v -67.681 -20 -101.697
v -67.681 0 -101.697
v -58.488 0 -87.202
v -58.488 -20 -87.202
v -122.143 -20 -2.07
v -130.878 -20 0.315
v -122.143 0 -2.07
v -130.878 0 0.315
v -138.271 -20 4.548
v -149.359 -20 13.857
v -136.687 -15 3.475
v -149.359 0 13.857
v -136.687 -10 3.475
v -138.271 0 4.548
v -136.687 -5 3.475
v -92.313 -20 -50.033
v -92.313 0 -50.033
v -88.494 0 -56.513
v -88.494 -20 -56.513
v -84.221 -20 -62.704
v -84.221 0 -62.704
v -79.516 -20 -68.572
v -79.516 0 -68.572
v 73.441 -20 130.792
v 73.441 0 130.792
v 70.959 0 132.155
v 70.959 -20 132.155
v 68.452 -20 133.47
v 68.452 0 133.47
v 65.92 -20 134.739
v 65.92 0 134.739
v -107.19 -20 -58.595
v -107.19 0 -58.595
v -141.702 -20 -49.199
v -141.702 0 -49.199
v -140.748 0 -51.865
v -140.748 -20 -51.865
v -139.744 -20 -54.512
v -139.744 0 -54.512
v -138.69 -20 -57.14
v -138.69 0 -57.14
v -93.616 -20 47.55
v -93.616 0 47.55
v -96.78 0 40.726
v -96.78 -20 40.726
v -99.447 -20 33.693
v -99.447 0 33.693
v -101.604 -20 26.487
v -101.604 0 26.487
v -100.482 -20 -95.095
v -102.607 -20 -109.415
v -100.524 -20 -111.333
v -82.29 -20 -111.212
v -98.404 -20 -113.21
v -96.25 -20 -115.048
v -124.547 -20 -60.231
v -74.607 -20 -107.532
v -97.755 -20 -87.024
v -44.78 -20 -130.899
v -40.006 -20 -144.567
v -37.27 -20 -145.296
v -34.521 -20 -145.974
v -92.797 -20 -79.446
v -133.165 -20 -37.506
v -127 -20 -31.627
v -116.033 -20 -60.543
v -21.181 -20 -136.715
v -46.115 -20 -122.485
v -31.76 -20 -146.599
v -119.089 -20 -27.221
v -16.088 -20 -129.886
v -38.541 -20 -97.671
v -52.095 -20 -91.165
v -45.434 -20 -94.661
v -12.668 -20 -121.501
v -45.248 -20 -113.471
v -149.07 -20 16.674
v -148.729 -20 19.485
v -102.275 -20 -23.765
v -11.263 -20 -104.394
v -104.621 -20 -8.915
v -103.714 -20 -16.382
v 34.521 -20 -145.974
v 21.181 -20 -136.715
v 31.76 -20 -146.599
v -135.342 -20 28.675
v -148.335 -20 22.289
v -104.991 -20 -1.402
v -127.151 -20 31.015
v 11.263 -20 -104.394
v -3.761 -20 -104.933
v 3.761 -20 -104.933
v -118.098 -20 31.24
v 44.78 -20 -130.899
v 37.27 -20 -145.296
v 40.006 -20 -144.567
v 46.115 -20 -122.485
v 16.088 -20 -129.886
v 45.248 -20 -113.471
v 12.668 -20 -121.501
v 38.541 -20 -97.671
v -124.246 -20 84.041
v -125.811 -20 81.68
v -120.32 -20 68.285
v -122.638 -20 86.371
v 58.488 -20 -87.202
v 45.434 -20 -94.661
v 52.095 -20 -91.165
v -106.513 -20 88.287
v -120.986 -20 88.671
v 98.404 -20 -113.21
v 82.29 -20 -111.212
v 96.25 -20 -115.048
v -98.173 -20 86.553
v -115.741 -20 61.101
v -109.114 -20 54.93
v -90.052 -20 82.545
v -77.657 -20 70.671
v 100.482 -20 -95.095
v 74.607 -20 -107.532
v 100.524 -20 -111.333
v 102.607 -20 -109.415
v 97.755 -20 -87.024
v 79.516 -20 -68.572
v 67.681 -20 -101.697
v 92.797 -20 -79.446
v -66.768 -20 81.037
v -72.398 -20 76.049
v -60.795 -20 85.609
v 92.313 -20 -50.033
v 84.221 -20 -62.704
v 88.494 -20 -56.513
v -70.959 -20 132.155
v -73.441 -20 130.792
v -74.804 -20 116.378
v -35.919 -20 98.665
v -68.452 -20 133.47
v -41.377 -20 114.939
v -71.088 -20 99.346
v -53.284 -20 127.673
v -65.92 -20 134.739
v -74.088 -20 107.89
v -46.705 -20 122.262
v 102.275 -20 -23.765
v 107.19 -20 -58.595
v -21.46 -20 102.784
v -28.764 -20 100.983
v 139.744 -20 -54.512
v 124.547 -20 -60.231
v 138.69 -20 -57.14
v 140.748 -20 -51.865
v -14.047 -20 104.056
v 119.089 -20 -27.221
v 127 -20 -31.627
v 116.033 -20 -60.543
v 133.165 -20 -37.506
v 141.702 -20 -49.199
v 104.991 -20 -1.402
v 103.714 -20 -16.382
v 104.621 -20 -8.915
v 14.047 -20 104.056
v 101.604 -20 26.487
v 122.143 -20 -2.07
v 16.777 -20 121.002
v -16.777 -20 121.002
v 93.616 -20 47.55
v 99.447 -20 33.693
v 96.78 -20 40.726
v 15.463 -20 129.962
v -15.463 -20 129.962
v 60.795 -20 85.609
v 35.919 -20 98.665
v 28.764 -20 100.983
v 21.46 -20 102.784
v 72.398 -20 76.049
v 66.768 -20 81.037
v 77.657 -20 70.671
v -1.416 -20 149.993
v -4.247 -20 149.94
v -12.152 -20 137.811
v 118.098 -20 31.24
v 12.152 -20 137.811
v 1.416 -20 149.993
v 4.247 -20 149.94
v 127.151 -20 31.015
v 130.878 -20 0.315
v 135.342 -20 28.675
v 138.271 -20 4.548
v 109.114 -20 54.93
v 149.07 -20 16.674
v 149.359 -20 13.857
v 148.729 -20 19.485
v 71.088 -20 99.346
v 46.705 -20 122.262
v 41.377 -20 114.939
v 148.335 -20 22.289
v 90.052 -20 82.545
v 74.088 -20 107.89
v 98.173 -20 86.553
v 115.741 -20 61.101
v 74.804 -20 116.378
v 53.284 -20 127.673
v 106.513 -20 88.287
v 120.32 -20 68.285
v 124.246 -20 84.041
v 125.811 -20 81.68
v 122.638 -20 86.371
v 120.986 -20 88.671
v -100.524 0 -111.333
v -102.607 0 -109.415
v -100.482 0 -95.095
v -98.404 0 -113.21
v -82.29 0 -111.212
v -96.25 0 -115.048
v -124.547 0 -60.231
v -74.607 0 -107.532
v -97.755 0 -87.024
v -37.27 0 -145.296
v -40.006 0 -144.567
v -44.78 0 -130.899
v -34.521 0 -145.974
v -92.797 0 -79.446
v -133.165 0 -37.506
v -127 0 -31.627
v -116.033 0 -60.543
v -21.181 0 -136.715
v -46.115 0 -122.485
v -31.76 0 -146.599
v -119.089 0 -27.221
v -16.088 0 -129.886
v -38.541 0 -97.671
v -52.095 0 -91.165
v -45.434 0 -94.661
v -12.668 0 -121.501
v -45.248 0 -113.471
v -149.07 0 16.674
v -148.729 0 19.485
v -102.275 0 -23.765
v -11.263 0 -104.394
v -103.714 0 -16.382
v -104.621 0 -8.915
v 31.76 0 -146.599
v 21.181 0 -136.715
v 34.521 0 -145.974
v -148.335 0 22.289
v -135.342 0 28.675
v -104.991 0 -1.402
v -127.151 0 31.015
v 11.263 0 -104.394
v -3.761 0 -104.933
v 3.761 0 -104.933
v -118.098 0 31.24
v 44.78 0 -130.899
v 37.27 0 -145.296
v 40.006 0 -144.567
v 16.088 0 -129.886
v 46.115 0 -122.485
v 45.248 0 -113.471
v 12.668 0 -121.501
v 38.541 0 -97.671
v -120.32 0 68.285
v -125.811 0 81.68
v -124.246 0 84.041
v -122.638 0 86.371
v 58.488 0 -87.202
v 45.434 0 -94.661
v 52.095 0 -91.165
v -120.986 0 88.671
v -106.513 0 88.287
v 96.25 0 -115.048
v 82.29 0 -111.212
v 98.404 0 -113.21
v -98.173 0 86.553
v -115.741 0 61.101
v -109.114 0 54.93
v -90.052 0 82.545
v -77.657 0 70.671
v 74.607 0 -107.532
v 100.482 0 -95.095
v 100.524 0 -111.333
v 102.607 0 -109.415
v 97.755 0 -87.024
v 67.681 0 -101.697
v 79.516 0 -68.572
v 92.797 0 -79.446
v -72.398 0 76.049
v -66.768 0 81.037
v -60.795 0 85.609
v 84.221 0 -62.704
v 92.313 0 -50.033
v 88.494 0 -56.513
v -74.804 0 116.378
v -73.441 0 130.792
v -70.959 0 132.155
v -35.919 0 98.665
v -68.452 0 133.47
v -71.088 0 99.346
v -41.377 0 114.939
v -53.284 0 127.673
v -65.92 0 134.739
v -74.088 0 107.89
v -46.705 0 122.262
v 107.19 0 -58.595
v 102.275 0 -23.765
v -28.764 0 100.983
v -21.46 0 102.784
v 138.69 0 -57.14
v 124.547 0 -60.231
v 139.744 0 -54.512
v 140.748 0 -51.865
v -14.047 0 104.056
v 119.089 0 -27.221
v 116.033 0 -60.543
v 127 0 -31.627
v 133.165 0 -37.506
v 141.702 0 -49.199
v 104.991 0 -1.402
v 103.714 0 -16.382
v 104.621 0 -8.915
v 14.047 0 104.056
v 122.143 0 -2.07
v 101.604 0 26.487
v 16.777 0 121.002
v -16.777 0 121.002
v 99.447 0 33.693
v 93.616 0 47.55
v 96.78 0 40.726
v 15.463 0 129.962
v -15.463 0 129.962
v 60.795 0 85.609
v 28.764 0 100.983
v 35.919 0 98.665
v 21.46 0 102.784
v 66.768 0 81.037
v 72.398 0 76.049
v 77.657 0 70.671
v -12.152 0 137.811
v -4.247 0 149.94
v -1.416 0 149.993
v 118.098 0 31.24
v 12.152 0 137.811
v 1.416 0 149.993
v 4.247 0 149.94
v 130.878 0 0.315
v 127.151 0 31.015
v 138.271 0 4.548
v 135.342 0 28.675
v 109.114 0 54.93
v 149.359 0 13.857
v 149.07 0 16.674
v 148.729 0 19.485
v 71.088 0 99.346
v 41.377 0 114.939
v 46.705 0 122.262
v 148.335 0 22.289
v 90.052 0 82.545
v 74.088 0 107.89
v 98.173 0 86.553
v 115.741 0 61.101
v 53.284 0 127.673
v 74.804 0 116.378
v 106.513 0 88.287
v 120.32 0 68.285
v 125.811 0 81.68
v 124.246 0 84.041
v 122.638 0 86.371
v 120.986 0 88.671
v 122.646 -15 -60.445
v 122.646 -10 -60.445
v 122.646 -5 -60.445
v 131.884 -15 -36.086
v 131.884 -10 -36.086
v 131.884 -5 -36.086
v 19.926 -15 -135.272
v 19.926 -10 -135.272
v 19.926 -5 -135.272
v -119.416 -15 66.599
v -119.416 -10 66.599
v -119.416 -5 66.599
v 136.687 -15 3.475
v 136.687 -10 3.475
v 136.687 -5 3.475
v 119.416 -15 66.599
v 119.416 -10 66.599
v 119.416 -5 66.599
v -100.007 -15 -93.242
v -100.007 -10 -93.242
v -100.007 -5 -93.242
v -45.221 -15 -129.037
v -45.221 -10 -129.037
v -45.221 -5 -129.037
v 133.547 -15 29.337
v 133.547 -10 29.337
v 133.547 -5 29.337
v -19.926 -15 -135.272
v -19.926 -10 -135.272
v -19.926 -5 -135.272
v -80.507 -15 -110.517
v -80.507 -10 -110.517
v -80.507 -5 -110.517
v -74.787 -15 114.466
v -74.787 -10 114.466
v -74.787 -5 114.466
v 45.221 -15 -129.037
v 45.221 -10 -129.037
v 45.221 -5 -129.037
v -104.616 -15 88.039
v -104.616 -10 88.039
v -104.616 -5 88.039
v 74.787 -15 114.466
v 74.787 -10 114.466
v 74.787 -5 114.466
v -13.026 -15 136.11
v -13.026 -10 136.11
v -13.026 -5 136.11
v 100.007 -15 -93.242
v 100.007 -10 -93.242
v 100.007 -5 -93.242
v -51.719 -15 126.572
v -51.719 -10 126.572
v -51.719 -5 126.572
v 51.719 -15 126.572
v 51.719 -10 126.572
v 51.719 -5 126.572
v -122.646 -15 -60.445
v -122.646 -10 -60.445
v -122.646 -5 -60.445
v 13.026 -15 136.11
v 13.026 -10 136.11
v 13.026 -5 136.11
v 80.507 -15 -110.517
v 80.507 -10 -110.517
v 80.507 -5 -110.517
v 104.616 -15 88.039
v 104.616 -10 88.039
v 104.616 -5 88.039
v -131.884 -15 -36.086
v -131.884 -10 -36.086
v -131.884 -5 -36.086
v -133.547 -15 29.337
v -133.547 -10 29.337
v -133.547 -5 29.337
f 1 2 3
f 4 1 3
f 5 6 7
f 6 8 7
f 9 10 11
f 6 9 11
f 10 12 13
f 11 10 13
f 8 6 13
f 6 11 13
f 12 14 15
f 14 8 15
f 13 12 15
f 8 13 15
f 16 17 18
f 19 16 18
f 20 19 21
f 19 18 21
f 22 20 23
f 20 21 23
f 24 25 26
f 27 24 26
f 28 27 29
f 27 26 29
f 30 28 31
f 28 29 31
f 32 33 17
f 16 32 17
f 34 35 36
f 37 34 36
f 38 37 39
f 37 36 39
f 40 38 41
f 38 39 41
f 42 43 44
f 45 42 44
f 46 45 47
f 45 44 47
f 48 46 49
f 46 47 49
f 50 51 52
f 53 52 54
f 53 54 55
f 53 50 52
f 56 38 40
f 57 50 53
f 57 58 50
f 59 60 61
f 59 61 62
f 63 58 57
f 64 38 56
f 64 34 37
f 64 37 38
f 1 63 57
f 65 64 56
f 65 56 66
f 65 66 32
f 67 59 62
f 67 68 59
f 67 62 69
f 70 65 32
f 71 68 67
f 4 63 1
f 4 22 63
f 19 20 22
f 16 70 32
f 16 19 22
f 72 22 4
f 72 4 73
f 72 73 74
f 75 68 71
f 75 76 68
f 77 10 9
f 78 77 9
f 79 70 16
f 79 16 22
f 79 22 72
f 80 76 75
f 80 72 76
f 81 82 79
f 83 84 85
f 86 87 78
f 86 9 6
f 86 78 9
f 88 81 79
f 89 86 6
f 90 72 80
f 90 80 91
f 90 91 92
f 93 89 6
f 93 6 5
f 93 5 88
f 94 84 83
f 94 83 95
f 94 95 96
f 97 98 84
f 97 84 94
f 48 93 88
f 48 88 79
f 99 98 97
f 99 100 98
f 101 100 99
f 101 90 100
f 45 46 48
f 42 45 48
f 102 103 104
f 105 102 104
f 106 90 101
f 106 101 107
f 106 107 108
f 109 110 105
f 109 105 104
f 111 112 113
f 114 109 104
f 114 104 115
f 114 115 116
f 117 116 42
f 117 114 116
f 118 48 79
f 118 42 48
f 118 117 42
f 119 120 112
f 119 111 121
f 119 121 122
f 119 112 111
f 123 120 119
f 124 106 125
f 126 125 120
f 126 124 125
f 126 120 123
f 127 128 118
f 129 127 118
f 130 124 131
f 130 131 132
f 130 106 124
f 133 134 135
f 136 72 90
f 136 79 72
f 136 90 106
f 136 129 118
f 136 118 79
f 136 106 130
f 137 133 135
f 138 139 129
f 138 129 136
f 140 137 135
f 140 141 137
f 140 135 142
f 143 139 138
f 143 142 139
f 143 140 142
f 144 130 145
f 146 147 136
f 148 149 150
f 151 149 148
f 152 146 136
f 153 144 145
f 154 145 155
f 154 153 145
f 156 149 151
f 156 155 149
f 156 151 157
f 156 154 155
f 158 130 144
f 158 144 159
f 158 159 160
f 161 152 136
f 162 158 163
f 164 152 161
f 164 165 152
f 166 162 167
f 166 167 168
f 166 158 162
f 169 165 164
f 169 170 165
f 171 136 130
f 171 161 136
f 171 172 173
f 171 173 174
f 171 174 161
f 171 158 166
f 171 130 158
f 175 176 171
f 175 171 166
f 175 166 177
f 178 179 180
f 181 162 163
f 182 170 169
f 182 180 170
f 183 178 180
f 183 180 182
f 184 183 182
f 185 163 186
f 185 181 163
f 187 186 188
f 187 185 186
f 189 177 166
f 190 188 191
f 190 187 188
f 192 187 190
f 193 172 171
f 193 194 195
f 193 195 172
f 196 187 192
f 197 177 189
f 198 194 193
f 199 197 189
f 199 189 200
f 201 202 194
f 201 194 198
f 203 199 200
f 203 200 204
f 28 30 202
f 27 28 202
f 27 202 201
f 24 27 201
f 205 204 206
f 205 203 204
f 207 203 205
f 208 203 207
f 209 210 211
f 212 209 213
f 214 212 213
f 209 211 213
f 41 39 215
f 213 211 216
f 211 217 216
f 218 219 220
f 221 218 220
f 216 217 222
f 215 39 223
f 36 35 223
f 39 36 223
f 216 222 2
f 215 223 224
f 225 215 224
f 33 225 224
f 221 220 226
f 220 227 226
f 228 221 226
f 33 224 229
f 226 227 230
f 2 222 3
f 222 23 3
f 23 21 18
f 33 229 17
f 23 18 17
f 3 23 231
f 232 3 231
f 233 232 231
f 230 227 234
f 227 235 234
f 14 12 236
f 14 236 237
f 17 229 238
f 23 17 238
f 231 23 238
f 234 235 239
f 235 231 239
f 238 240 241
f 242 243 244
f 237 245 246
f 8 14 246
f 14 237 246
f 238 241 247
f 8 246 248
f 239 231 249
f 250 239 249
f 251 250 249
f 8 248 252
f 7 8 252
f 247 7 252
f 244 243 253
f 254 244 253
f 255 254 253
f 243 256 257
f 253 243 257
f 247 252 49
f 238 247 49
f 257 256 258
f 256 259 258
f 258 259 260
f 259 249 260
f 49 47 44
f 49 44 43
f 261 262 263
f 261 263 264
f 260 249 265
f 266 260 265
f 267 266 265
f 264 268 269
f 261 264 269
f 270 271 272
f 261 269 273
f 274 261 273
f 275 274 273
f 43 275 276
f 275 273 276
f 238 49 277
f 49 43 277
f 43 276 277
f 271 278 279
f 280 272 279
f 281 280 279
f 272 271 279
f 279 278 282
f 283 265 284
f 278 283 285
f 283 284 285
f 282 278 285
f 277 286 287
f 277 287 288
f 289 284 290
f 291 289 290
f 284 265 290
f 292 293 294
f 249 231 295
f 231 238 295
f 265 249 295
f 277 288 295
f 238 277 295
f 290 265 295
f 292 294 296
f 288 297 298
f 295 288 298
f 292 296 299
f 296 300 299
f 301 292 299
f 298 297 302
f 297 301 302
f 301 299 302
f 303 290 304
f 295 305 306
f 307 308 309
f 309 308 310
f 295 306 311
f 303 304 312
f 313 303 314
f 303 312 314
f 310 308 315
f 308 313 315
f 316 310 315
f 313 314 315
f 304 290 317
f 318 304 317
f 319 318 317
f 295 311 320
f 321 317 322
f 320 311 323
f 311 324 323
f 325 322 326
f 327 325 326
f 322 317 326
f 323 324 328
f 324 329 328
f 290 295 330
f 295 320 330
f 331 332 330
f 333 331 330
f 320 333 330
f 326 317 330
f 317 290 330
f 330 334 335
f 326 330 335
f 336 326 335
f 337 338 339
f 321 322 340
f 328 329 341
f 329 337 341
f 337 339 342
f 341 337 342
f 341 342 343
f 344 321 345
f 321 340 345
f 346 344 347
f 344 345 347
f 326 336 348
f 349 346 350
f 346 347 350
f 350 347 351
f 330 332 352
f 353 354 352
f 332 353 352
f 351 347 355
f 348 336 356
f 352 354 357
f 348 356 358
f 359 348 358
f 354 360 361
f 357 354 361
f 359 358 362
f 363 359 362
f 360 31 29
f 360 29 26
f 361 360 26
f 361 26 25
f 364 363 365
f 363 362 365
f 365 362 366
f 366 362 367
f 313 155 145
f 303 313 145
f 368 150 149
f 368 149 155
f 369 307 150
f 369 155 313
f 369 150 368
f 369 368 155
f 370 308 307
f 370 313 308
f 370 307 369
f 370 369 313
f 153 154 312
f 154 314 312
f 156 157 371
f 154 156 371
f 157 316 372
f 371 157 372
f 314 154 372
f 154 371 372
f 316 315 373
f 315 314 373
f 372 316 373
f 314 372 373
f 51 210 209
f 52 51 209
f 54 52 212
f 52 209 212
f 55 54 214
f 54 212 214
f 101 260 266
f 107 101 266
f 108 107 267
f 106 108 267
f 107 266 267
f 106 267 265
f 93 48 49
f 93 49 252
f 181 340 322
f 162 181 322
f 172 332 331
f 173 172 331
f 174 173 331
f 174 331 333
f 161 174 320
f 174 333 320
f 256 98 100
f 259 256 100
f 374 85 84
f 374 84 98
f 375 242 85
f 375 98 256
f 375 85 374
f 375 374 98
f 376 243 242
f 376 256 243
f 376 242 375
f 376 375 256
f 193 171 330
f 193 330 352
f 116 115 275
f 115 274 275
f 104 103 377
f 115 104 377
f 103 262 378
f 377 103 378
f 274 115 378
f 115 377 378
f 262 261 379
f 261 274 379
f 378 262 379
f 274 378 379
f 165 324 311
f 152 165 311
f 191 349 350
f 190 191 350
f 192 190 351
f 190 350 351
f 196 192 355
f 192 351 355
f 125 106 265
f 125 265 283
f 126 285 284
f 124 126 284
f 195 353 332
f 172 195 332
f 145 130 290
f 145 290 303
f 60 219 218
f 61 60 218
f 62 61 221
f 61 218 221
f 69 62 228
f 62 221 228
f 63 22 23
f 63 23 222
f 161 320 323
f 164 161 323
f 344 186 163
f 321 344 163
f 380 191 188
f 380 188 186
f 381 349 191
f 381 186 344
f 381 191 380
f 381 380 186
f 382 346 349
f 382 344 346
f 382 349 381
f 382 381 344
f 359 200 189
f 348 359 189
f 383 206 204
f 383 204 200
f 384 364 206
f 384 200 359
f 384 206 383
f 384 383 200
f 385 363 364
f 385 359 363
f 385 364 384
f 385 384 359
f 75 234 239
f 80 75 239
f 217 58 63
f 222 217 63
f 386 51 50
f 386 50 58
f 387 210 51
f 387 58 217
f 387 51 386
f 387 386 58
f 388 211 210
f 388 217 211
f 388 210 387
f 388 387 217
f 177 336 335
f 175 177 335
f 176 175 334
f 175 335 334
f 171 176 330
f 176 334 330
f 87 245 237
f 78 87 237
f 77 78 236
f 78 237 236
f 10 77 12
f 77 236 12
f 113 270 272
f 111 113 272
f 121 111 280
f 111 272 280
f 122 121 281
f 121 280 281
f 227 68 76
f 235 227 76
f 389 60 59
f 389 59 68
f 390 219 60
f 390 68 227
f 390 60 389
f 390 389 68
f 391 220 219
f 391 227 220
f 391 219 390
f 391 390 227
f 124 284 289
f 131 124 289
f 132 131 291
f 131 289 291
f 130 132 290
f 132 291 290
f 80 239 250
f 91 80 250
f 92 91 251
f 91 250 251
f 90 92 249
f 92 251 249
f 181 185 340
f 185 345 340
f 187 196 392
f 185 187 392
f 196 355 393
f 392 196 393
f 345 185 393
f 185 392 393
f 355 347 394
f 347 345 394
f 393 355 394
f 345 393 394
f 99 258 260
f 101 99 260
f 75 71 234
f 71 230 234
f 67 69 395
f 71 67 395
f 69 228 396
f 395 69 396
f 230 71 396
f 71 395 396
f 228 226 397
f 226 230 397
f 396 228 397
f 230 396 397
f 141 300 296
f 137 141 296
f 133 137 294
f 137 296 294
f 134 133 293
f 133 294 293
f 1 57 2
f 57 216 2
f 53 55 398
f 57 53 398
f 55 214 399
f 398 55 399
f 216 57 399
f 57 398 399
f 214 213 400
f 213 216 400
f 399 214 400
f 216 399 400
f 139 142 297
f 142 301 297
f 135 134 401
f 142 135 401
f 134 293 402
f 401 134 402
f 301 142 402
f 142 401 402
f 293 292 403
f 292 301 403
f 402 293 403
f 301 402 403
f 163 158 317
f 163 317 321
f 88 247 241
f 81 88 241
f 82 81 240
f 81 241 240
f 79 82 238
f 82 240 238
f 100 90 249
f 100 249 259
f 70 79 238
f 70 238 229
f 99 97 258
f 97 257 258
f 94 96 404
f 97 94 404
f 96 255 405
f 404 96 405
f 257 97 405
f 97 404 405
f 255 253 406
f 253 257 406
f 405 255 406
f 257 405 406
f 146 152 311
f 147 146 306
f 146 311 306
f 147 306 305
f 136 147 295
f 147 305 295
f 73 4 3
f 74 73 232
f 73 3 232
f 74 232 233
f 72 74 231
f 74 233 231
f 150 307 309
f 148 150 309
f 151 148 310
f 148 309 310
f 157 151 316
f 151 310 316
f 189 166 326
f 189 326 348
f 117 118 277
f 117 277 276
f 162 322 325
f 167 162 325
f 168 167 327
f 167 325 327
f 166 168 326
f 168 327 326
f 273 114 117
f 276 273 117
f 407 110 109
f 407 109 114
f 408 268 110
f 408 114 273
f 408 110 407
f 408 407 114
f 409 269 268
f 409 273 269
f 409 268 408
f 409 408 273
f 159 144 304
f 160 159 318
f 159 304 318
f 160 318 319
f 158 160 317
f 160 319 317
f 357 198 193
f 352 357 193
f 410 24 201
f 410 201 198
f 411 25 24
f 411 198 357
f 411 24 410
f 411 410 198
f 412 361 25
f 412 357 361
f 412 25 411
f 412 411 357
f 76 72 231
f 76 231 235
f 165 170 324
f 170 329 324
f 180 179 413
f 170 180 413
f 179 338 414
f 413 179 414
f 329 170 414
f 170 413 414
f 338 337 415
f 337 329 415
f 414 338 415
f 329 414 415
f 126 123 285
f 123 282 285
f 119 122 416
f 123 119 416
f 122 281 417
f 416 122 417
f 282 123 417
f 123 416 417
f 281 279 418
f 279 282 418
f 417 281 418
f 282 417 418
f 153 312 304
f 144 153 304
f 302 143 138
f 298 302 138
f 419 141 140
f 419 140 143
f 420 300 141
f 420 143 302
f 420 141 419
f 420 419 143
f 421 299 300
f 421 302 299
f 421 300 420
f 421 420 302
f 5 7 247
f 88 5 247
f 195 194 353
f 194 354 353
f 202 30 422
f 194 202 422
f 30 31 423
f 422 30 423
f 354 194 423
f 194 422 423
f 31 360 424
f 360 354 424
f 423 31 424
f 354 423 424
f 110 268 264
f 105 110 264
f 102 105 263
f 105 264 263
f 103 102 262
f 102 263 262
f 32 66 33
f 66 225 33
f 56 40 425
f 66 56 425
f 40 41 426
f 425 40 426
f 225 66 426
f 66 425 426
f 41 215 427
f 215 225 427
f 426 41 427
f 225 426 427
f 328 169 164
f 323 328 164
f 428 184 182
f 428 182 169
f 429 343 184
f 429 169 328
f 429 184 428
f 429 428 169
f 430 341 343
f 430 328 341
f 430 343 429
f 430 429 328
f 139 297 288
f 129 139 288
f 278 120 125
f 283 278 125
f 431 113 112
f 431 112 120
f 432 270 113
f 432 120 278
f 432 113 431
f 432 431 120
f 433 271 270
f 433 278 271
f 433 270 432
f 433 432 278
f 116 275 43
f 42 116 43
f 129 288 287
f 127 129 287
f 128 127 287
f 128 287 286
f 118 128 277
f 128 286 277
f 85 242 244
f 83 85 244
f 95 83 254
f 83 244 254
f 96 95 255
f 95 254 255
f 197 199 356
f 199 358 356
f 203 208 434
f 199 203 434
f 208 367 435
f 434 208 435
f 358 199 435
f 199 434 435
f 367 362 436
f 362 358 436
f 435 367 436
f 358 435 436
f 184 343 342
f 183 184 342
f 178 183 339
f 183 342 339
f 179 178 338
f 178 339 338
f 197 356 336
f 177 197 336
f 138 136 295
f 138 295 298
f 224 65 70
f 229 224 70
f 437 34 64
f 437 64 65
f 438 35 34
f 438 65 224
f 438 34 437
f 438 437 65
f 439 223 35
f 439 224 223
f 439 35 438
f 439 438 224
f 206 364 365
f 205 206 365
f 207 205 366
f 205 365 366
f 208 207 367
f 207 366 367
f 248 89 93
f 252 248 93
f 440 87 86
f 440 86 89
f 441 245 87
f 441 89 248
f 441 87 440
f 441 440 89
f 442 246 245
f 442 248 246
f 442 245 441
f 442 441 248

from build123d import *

# Parameters (mm, degrees)
F2_DEPTH        = 20
F2_COPIES_COUNT = 13
F4_DEPTH        = 20


# Not quite as in the source:
# - a pattern or mirror of a feature is missing from the dataset's text; its kind, count and spacing are read off the source's solid


with BuildPart() as f2:
    # F1 (on Front) → F2 (new body)
    with BuildSketch(Plane.XZ):
        with BuildLine():
            ThreePointArc((-14.0470065876, 104.0561464111), (0, 105), (14.0470065876, 104.0561464111))
            Line((14.0470065876, 104.0561464111), (16.7773367506, 121.0024649167))
            add(Edge.make_bspline(
                [(4.2468093523, 149.9398699824), (4.4290412164, 149.7210246606), (8.7826343305, 144.3294696938), (13.1358942294, 135.9586969958), (15.9340407786, 130.266903883), (16.7579313288, 121.3103558316), (16.7773367506, 121.0024649167)],
                knots=[0, 0, 0, 0, 0.2214991664, 0.5040555337, 0.7473622312, 1, 1, 1, 1], degree=3))
            ThreePointArc((4.2468093523, 149.9398699824), (0, 150), (-4.2468093523, 149.9398699824))
            add(Edge.make_bspline(
                [(-4.2468093523, 149.9398699824), (-4.4290412164, 149.7210246606), (-8.7826343305, 144.3294696938), (-13.1358942294, 135.9586969958), (-15.9340407786, 130.266903883), (-16.7579313288, 121.3103558316), (-16.7773367506, 121.0024649167)],
                knots=[0, 0, 0, 0, 0.2214991664, 0.5040555337, 0.7473622312, 1, 1, 1, 1], degree=3))
            Line((-16.7773367506, 121.0024649167), (-14.0470065876, 104.0561464111))
        make_face()
    extrude(amount=F2_DEPTH)


with BuildPart() as f2_copies_1:
    # F2_copies: instance of F2
    add(f2.part.rotate(Axis((0, 0, 0), (0, 1, 0)), 1 * 360 / F2_COPIES_COUNT))


with BuildPart() as f2_copies_2:
    # F2_copies: instance of F2
    add(f2.part.rotate(Axis((0, 0, 0), (0, 1, 0)), 2 * 360 / F2_COPIES_COUNT))


with BuildPart() as f2_copies_3:
    # F2_copies: instance of F2
    add(f2.part.rotate(Axis((0, 0, 0), (0, 1, 0)), 3 * 360 / F2_COPIES_COUNT))


with BuildPart() as f2_copies_4:
    # F2_copies: instance of F2
    add(f2.part.rotate(Axis((0, 0, 0), (0, 1, 0)), 4 * 360 / F2_COPIES_COUNT))


with BuildPart() as f2_copies_5:
    # F2_copies: instance of F2
    add(f2.part.rotate(Axis((0, 0, 0), (0, 1, 0)), 5 * 360 / F2_COPIES_COUNT))


with BuildPart() as f2_copies_6:
    # F2_copies: instance of F2
    add(f2.part.rotate(Axis((0, 0, 0), (0, 1, 0)), 6 * 360 / F2_COPIES_COUNT))


with BuildPart() as f2_copies_7:
    # F2_copies: instance of F2
    add(f2.part.rotate(Axis((0, 0, 0), (0, 1, 0)), 7 * 360 / F2_COPIES_COUNT))


with BuildPart() as f2_copies_8:
    # F2_copies: instance of F2
    add(f2.part.rotate(Axis((0, 0, 0), (0, 1, 0)), 8 * 360 / F2_COPIES_COUNT))


with BuildPart() as f2_copies_9:
    # F2_copies: instance of F2
    add(f2.part.rotate(Axis((0, 0, 0), (0, 1, 0)), 9 * 360 / F2_COPIES_COUNT))


with BuildPart() as f2_copies_10:
    # F2_copies: instance of F2
    add(f2.part.rotate(Axis((0, 0, 0), (0, 1, 0)), 10 * 360 / F2_COPIES_COUNT))


with BuildPart() as f2_copies_11:
    # F2_copies: instance of F2
    add(f2.part.rotate(Axis((0, 0, 0), (0, 1, 0)), 11 * 360 / F2_COPIES_COUNT))


with BuildPart() as f2_copies_12:
    # F2_copies: instance of F2
    add(f2.part.rotate(Axis((0, 0, 0), (0, 1, 0)), 12 * 360 / F2_COPIES_COUNT))


with BuildPart() as f2_1:
    add(f2.part)

    add(f2_copies_1.part)  # F4 merges F2_copies_1

    add(f2_copies_2.part)  # F4 merges F2_copies_2

    add(f2_copies_3.part)  # F4 merges F2_copies_3

    add(f2_copies_4.part)  # F4 merges F2_copies_4

    add(f2_copies_5.part)  # F4 merges F2_copies_5

    add(f2_copies_6.part)  # F4 merges F2_copies_6

    add(f2_copies_7.part)  # F4 merges F2_copies_7

    add(f2_copies_8.part)  # F4 merges F2_copies_8

    add(f2_copies_9.part)  # F4 merges F2_copies_9

    add(f2_copies_10.part)  # F4 merges F2_copies_10

    add(f2_copies_11.part)  # F4 merges F2_copies_11

    add(f2_copies_12.part)  # F4 merges F2_copies_12
    # F1 (on Front) → F4 (join)
    with BuildSketch(Plane.XZ):
        with BuildLine():
            ThreePointArc((-14.0470065876, 104.0561464111), (-69.1016074643, -79.0567381432), (105, 0))
            ThreePointArc((105, 0), (79.0567381432, 69.1016074643), (14.0470065876, 104.0561464111))
            ThreePointArc((14.0470065876, 104.0561464111), (0, 105), (-14.0470065876, 104.0561464111))
        make_face()
    extrude(amount=F4_DEPTH)


solid = f2_1.part
